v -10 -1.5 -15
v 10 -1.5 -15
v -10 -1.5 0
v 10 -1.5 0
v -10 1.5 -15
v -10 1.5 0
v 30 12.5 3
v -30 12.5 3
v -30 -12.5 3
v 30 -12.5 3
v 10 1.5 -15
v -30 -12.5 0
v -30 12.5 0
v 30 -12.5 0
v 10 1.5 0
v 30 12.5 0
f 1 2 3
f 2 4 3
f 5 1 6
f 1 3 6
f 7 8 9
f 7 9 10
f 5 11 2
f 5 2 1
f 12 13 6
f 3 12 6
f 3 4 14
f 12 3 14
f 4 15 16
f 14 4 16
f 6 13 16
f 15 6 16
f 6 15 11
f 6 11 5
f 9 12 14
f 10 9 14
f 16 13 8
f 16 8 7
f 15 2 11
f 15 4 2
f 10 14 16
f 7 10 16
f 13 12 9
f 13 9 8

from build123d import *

# Parameters (mm, degrees)
CROQUIS1_W              = 60
CROQUIS1_H              = 25
SALIENTE_EXTRUIR1_DEPTH = 5
CROQUIS2_W              = 20
CROQUIS2_H              = 3
SALIENTE_EXTRUIR2_DEPTH = 10
CROQUIS3_W              = 60
CROQUIS3_H              = 25
CORTAR_EXTRUIR1_DEPTH   = 2
CROQUIS4_W              = 20
CROQUIS4_H              = 3
SALIENTE_EXTRUIR3_DEPTH = 5


with BuildPart() as part:
    # Croquis1 → Saliente-Extruir1 (new body)
    with BuildSketch(Plane.XY):
        Rectangle(CROQUIS1_W, CROQUIS1_H)
    extrude(amount=SALIENTE_EXTRUIR1_DEPTH)

    # Croquis2 → Saliente-Extruir2 (add)
    with BuildSketch(Plane(origin=(0, 0, 0), x_dir=(-1, 0, 0), z_dir=(0, 0, -1))):
        Rectangle(CROQUIS2_W, CROQUIS2_H)
    extrude(amount=SALIENTE_EXTRUIR2_DEPTH)

    # Croquis3 → Cortar-Extruir1 (cut)
    with BuildSketch(Plane.XY.offset(5)):
        Rectangle(CROQUIS3_W, CROQUIS3_H)
    extrude(amount=-CORTAR_EXTRUIR1_DEPTH, mode=Mode.SUBTRACT)

    # Croquis4 → Saliente-Extruir3 (add)
    with BuildSketch(Plane(origin=(0, 0, -10), x_dir=(-1, 0, 0), z_dir=(0, 0, -1))):
        Rectangle(CROQUIS4_W, CROQUIS4_H)
    extrude(amount=SALIENTE_EXTRUIR3_DEPTH)


solid = part.part
